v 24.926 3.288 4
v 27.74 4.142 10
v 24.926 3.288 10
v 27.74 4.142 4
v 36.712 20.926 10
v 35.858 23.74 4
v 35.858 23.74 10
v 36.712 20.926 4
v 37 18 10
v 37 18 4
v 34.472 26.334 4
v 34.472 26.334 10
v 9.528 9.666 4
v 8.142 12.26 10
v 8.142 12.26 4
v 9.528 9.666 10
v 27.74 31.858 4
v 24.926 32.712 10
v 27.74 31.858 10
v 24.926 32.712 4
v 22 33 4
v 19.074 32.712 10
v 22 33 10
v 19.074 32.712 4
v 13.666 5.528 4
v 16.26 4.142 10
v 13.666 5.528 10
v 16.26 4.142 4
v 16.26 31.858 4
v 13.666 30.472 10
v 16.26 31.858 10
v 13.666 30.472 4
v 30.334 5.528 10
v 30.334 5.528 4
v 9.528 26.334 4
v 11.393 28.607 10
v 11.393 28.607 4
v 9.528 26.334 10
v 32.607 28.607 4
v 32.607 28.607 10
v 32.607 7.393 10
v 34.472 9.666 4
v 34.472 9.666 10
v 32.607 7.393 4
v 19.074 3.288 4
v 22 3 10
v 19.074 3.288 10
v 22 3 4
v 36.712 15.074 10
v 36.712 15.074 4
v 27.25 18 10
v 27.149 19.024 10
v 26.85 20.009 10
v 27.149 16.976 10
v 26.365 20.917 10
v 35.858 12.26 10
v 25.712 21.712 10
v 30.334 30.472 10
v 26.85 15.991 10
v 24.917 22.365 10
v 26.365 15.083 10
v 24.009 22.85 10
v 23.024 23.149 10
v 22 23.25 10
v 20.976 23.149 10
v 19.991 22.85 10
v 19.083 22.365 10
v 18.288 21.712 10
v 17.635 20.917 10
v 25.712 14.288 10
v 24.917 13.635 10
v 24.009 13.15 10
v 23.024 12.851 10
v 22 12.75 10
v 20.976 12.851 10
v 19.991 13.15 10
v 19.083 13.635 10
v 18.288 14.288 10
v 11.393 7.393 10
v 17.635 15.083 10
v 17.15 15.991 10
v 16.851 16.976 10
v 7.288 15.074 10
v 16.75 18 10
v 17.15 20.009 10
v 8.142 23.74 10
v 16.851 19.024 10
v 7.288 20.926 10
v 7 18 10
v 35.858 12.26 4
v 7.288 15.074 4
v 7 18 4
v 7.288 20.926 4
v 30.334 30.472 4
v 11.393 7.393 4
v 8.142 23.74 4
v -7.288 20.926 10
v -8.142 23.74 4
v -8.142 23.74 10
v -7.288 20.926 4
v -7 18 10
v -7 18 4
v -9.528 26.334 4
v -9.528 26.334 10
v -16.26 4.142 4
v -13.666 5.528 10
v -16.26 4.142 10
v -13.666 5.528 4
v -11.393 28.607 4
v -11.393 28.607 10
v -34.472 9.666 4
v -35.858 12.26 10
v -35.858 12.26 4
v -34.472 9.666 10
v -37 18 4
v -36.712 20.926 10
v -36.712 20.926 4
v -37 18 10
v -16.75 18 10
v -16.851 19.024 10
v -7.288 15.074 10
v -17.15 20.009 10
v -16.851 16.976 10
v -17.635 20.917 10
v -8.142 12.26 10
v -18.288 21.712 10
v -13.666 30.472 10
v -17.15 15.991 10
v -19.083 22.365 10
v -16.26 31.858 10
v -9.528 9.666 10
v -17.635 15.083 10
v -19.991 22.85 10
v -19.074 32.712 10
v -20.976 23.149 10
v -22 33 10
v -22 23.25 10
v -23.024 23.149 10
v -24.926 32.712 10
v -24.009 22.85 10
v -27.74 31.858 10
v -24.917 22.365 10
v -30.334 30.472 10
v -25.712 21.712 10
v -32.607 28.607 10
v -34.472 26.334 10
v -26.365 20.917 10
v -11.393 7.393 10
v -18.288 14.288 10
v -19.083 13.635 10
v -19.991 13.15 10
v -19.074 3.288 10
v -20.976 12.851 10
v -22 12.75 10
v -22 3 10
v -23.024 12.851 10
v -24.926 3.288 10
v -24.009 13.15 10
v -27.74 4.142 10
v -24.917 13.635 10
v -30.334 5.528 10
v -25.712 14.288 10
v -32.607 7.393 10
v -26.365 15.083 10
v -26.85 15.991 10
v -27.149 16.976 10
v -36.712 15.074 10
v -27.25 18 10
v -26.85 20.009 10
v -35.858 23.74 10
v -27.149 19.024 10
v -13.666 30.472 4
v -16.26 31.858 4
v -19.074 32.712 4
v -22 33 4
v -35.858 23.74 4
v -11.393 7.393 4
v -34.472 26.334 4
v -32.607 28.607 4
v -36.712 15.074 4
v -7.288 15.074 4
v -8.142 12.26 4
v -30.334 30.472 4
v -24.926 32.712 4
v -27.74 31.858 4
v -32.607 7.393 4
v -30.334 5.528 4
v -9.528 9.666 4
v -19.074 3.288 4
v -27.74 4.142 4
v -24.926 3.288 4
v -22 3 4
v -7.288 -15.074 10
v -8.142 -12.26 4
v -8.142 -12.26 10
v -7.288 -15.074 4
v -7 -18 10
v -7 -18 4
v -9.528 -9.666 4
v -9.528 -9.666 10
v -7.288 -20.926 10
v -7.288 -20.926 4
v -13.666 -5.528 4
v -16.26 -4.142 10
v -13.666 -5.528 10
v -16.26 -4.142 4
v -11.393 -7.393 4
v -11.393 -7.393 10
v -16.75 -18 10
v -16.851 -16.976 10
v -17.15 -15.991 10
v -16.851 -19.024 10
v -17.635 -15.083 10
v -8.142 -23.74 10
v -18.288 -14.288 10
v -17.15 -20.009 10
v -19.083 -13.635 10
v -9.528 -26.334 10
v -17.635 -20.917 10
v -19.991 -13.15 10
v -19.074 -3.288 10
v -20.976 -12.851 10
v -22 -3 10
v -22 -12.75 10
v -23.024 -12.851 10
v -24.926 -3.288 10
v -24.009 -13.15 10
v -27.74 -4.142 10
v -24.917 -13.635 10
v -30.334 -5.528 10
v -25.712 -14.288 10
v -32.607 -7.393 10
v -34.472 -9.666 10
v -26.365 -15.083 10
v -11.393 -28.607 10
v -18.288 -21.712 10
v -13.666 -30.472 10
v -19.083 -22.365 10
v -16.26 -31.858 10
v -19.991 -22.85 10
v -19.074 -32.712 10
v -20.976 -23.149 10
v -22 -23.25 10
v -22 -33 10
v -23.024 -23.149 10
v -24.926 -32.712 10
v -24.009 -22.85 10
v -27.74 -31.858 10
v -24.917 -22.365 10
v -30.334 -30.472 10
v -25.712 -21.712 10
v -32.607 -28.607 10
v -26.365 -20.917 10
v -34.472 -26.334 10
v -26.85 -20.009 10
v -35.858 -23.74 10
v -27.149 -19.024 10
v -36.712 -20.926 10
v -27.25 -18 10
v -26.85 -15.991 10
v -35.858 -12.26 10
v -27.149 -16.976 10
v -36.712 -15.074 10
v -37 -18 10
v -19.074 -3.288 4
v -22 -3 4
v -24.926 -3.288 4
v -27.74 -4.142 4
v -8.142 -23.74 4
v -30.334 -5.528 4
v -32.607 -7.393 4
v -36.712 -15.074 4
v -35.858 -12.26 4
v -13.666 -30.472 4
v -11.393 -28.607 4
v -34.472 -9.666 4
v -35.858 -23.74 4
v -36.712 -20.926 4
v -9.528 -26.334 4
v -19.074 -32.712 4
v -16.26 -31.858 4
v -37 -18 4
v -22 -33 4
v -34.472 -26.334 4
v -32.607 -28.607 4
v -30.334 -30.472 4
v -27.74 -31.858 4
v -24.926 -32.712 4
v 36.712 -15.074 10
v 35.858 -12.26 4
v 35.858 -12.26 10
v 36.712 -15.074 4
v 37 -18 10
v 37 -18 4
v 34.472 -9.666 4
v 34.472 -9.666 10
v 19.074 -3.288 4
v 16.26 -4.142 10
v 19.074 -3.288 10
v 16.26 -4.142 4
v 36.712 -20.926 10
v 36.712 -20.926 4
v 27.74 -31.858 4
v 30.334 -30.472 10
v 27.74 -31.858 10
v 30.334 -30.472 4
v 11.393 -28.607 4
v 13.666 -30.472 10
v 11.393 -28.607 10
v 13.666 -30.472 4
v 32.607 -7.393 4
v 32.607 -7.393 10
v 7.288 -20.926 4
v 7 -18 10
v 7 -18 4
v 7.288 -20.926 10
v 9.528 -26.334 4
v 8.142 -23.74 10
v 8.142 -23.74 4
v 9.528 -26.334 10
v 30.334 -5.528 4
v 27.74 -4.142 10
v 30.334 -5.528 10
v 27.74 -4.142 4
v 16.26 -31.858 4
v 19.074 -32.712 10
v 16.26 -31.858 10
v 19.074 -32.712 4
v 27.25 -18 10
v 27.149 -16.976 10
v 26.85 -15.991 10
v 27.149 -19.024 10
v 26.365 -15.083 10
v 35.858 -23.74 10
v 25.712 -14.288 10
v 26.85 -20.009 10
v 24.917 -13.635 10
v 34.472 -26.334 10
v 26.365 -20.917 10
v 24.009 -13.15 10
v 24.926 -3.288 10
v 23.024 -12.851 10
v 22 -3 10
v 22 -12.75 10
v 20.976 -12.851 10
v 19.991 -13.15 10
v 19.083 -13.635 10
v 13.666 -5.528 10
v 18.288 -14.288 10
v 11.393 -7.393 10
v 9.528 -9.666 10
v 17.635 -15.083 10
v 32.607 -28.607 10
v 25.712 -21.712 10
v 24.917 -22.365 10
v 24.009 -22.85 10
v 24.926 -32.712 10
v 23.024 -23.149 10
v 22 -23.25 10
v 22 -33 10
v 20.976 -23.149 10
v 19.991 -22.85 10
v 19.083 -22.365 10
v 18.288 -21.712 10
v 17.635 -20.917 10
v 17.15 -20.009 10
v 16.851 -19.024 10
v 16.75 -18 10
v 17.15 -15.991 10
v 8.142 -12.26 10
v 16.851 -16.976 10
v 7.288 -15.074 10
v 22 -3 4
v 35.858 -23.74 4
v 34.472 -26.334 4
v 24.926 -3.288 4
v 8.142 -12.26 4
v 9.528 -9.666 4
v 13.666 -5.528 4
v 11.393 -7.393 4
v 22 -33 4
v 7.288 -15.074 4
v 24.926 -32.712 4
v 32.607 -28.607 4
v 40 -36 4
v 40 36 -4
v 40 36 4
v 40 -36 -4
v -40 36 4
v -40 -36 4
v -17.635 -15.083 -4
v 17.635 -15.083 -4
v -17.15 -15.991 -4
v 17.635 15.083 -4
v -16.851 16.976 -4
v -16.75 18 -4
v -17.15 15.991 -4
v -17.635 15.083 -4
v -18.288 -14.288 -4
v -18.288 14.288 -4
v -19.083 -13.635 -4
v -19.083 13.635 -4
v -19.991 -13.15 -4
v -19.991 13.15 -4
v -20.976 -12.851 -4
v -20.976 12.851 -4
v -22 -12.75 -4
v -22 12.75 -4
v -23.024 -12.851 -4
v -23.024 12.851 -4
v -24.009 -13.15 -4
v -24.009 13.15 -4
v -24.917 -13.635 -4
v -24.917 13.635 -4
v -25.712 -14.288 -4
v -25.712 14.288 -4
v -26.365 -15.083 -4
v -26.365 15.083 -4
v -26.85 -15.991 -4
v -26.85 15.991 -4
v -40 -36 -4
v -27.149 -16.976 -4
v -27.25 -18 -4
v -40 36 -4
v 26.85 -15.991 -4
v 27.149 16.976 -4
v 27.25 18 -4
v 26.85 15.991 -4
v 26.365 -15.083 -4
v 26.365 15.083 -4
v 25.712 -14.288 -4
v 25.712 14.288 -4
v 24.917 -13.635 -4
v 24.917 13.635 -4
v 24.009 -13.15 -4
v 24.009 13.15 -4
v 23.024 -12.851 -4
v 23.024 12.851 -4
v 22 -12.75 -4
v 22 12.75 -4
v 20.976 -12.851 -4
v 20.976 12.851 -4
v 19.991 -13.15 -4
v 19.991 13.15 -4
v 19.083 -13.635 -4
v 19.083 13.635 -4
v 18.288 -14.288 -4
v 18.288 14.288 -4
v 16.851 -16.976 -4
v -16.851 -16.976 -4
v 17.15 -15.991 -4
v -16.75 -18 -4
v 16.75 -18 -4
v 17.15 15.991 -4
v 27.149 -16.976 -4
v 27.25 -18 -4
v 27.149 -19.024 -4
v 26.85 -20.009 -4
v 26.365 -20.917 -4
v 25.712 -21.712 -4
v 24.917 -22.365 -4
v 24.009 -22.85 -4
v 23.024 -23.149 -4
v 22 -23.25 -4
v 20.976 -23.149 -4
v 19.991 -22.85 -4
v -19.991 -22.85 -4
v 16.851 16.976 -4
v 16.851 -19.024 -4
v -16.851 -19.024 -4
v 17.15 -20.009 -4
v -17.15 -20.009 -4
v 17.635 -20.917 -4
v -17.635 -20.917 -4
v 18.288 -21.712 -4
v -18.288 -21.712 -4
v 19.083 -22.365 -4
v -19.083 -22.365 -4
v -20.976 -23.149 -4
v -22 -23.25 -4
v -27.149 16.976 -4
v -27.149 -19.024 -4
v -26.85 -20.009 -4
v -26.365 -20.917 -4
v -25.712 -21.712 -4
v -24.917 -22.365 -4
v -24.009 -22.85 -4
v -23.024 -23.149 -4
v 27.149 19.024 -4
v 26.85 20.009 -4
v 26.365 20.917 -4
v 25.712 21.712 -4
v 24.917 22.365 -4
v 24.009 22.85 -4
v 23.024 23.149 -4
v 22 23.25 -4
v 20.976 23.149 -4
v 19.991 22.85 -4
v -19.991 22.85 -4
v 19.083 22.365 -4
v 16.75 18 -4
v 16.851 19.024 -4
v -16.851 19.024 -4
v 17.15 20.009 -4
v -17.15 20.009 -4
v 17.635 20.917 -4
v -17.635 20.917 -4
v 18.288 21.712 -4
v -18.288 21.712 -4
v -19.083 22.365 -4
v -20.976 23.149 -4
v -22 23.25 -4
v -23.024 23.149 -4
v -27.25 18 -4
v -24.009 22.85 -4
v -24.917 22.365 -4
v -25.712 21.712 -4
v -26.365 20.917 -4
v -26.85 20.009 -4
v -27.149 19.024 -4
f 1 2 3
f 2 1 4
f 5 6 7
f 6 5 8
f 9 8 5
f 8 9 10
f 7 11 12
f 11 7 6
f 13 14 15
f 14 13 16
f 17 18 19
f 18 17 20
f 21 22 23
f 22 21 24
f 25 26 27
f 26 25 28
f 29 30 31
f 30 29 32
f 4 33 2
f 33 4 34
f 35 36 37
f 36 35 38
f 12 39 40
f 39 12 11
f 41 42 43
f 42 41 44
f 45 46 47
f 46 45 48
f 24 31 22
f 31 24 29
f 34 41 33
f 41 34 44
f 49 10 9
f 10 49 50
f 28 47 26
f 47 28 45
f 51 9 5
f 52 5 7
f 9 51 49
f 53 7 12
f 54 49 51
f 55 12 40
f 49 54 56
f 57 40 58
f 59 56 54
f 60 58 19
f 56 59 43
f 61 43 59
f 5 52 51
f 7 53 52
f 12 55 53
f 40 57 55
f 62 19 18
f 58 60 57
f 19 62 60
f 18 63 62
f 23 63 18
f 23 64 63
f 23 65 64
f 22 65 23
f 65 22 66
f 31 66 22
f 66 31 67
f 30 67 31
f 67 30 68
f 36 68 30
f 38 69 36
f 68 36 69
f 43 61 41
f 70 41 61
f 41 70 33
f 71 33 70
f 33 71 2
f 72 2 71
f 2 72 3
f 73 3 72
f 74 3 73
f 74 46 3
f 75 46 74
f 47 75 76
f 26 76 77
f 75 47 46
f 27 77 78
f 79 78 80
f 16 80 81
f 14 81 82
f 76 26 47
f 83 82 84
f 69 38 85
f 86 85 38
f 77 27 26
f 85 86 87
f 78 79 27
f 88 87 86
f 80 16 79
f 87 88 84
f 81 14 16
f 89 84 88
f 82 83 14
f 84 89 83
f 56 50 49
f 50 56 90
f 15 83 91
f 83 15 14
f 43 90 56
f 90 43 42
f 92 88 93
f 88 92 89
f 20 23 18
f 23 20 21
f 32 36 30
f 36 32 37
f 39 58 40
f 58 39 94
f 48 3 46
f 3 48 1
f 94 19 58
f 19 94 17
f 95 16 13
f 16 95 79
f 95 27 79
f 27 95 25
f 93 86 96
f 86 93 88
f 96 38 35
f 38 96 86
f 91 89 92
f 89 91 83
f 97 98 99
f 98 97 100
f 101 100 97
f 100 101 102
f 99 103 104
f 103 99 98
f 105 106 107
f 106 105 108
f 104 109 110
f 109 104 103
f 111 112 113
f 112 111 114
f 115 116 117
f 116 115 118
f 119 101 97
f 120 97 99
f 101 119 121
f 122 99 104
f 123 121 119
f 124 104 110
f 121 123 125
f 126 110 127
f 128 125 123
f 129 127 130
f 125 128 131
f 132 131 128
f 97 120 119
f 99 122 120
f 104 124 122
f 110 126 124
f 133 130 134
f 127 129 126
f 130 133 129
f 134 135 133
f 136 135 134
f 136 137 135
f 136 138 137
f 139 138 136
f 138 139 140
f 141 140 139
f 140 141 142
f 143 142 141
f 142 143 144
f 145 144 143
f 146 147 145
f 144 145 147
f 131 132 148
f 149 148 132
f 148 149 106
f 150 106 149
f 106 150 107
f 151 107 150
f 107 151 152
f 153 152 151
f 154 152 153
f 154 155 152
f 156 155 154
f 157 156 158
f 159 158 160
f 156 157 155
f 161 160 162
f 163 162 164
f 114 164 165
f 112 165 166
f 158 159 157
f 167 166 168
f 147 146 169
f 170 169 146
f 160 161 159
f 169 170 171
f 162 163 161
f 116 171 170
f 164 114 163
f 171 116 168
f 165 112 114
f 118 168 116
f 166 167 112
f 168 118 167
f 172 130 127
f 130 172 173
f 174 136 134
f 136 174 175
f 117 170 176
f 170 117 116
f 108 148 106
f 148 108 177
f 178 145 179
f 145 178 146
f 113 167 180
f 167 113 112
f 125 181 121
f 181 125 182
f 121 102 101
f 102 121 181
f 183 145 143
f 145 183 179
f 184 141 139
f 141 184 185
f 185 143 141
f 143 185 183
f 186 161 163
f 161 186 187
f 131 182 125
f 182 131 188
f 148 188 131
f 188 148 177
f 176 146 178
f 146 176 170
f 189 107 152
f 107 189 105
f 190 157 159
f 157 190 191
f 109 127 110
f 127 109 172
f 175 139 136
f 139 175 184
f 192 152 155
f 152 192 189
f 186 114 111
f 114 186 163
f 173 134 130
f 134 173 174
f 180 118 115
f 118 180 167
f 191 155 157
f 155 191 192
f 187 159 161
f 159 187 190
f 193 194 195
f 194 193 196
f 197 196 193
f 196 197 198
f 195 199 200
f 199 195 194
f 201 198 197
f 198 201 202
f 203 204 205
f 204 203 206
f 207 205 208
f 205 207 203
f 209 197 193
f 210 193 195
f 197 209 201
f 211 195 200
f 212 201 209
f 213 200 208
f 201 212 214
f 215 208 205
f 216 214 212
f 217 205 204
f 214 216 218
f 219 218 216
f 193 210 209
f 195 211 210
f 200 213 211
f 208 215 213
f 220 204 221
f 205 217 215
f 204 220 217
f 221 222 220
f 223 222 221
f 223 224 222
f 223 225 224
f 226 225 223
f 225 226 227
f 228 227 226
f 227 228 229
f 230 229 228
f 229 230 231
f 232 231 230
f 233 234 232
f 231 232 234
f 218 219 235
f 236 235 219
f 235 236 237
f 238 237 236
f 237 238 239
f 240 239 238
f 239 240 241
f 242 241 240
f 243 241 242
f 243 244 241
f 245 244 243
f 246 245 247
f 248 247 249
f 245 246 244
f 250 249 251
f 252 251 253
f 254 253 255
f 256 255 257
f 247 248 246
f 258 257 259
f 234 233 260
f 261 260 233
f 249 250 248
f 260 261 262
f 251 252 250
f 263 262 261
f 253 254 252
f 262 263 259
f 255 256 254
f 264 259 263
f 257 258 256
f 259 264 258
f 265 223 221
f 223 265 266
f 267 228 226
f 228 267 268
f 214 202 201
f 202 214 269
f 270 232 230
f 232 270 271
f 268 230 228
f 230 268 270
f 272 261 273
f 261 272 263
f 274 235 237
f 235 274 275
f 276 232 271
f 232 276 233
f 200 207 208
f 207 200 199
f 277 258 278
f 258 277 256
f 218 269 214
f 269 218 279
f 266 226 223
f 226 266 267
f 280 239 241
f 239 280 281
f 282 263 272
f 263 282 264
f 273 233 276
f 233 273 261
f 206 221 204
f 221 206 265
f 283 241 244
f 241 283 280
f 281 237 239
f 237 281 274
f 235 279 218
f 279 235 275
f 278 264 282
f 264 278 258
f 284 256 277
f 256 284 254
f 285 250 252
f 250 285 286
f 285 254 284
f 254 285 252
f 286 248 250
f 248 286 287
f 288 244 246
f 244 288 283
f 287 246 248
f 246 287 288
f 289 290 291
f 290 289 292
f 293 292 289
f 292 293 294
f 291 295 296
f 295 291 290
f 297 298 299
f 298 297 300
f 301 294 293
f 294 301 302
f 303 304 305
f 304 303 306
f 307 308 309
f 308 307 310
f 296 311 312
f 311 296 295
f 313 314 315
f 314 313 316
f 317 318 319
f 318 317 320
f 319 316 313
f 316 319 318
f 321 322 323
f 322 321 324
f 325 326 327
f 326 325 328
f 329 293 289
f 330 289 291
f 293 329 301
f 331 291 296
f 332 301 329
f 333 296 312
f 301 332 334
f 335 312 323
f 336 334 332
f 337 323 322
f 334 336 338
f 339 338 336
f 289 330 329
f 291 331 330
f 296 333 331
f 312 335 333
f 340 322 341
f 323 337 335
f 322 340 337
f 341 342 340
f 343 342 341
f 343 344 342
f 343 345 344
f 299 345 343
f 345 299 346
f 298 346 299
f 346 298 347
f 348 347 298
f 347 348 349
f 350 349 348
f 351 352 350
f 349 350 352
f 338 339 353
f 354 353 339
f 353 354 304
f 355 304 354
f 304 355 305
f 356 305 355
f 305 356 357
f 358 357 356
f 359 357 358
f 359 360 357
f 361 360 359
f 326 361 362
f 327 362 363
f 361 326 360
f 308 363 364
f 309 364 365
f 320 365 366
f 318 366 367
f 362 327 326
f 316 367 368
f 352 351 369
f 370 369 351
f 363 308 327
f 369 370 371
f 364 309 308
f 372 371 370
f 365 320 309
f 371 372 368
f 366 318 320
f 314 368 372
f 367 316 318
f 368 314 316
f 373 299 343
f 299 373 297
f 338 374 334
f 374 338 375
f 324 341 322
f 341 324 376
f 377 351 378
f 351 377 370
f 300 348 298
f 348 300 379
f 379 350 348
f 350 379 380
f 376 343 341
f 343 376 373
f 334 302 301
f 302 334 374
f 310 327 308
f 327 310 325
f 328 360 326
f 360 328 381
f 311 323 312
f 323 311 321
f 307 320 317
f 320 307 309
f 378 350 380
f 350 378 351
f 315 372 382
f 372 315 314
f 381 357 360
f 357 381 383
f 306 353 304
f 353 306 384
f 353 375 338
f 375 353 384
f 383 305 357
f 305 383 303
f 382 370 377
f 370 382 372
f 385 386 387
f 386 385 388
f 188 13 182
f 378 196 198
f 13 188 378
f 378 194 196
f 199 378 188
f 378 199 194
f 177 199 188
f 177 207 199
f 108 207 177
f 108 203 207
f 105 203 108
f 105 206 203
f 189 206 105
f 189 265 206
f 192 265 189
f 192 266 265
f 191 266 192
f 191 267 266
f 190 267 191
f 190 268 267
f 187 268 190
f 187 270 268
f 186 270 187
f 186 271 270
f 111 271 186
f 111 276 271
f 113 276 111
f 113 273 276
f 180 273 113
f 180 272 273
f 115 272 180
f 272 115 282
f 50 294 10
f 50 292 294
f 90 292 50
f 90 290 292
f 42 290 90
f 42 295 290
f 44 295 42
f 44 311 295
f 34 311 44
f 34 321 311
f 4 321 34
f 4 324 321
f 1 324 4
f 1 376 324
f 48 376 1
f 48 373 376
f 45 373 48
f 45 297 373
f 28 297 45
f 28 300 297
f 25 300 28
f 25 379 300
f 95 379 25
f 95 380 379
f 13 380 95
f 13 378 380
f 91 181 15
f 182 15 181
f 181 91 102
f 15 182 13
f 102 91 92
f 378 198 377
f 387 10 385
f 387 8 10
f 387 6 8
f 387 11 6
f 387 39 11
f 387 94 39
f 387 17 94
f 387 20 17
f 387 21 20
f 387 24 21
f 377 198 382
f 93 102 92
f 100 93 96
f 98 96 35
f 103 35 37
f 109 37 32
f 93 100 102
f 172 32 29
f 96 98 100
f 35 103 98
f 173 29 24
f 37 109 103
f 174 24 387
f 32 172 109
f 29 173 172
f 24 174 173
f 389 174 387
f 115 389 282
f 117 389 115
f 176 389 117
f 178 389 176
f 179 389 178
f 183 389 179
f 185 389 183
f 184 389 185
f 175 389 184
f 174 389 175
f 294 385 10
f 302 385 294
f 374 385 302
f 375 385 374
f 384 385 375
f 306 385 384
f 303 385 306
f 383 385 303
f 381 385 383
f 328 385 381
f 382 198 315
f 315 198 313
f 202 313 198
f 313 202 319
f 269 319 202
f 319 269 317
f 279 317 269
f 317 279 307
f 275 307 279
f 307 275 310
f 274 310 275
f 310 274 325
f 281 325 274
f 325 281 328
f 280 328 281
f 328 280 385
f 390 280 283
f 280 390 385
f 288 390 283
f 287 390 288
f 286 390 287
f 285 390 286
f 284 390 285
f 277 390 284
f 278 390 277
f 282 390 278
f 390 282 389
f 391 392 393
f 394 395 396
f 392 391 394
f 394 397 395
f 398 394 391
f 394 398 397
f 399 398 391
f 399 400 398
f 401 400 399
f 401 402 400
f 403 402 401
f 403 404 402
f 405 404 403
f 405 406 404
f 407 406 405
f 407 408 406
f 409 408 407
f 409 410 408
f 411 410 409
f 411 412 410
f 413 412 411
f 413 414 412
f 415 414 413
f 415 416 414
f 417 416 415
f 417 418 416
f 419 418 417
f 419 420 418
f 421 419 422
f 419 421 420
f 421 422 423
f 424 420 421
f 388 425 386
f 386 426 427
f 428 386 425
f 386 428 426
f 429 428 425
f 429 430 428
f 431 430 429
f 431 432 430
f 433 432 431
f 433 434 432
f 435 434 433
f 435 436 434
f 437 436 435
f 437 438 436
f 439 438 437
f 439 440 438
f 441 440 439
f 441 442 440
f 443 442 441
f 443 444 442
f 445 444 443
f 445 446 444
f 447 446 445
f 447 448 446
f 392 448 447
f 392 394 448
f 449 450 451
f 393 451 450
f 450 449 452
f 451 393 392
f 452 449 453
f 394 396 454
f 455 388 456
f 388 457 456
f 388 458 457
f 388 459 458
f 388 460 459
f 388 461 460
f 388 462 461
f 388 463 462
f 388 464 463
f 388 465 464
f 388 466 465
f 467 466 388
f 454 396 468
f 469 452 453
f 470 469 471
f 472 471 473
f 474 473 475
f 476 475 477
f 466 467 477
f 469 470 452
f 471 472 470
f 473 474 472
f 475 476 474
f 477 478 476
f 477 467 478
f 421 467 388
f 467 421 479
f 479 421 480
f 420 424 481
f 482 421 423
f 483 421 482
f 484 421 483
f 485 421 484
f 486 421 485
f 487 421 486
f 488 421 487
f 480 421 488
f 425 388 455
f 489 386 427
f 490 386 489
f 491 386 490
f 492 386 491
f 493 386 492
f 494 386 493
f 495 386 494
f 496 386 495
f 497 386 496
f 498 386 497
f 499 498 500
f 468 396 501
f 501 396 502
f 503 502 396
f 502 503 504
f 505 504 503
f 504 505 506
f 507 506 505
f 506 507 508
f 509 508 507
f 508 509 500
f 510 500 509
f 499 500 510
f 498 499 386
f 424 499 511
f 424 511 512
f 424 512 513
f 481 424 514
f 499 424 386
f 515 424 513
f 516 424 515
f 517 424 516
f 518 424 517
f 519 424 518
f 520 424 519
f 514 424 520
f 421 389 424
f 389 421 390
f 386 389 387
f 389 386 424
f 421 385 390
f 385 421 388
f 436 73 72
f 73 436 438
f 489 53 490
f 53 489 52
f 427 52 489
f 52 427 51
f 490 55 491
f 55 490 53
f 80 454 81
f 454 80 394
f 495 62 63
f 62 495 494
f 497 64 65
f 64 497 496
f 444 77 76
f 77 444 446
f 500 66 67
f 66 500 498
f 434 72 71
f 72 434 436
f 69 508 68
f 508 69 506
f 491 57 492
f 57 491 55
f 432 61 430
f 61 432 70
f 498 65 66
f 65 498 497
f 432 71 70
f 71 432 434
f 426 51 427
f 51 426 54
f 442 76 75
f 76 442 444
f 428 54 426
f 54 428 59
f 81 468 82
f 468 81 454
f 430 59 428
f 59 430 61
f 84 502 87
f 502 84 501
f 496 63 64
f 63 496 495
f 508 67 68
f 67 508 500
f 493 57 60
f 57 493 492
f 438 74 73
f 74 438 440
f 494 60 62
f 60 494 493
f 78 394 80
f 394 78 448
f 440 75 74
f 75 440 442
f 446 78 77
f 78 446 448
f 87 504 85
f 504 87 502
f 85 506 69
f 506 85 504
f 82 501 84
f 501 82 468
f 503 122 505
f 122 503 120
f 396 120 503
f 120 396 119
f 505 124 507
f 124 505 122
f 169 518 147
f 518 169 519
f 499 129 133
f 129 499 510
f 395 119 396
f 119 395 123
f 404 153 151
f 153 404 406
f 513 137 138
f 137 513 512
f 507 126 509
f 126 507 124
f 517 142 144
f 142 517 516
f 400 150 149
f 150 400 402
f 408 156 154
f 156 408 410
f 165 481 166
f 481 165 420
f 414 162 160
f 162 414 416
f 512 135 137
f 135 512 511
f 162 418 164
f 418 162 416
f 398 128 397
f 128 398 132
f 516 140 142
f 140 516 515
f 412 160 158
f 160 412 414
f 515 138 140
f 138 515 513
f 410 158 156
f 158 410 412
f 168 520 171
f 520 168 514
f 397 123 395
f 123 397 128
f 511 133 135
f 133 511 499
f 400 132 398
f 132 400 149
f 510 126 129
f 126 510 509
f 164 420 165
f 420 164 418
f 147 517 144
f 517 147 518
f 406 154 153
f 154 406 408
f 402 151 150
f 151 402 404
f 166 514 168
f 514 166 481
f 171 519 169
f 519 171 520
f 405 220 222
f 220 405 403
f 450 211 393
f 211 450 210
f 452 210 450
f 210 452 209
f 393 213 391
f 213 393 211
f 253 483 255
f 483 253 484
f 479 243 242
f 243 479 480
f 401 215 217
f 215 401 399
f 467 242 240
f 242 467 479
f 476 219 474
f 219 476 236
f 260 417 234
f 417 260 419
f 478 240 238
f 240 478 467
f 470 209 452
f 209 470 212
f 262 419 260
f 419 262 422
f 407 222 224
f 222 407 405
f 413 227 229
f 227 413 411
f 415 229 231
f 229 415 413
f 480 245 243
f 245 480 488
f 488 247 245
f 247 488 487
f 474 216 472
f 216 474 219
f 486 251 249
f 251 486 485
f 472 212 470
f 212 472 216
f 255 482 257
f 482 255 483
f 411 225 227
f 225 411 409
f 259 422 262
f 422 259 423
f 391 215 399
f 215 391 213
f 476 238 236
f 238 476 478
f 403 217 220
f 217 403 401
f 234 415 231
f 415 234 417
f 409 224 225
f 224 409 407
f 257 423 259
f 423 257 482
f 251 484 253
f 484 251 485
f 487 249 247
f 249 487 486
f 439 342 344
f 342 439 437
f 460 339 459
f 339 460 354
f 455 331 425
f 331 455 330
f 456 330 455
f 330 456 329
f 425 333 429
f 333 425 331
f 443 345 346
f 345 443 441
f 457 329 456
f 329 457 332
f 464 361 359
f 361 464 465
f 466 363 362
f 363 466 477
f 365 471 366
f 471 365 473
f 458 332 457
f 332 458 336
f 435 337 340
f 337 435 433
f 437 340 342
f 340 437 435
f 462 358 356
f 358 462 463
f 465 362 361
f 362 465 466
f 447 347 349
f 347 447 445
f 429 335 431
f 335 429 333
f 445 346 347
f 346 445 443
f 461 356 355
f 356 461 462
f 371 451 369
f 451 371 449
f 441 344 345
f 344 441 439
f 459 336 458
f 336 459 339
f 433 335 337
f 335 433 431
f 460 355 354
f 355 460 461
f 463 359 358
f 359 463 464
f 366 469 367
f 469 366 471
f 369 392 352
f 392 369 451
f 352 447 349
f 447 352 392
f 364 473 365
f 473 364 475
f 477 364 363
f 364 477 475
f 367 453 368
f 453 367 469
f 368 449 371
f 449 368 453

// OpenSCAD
$fn = 32;

// ----------------------------------------------------------------------
// Anchor pads 80 x 72 x 14
// four corner bosses with anchor holes
// ----------------------------------------------------------------------

// --- parameters (mm) ---
plate = [80, 72, 8];  // base plate size (x, y, z)
pads = 4;             // boss count, one per corner
edge = 18;            // boss centre offset from the plate edge
boss_d = 30;          // boss diameter
boss_h = 6;           // boss height above the base plate
hole_d = 10.5;        // hole diameter

// --- derived feature positions (mm) ---
height = plate[2] + boss_h;      // = 14   overall height of the part
corner_x = plate[0] / 2 - edge;  // = 22   boss centre X
corner_y = plate[1] / 2 - edge;  // = 18   boss centre Y
feature_centers = [
  [corner_x, corner_y],
  [-corner_x, corner_y],
  [-corner_x, -corner_y],
  [corner_x, -corner_y]
];   // boss centres, anchor holes are drilled there

// base plate, four bosses standing on it, anchor holes all the way through
difference() {
  union() {
    cube(plate, center = true);
    for (centre = feature_centers)
      translate([centre[0], centre[1], plate[2] / 2 - 1])
        cylinder(d = boss_d, h = boss_h + 1);
  }
  for (centre = feature_centers)
    translate([centre[0], centre[1], -height])
      cylinder(d = hole_d, h = 2 * height + 2);  // through boss and plate
}
